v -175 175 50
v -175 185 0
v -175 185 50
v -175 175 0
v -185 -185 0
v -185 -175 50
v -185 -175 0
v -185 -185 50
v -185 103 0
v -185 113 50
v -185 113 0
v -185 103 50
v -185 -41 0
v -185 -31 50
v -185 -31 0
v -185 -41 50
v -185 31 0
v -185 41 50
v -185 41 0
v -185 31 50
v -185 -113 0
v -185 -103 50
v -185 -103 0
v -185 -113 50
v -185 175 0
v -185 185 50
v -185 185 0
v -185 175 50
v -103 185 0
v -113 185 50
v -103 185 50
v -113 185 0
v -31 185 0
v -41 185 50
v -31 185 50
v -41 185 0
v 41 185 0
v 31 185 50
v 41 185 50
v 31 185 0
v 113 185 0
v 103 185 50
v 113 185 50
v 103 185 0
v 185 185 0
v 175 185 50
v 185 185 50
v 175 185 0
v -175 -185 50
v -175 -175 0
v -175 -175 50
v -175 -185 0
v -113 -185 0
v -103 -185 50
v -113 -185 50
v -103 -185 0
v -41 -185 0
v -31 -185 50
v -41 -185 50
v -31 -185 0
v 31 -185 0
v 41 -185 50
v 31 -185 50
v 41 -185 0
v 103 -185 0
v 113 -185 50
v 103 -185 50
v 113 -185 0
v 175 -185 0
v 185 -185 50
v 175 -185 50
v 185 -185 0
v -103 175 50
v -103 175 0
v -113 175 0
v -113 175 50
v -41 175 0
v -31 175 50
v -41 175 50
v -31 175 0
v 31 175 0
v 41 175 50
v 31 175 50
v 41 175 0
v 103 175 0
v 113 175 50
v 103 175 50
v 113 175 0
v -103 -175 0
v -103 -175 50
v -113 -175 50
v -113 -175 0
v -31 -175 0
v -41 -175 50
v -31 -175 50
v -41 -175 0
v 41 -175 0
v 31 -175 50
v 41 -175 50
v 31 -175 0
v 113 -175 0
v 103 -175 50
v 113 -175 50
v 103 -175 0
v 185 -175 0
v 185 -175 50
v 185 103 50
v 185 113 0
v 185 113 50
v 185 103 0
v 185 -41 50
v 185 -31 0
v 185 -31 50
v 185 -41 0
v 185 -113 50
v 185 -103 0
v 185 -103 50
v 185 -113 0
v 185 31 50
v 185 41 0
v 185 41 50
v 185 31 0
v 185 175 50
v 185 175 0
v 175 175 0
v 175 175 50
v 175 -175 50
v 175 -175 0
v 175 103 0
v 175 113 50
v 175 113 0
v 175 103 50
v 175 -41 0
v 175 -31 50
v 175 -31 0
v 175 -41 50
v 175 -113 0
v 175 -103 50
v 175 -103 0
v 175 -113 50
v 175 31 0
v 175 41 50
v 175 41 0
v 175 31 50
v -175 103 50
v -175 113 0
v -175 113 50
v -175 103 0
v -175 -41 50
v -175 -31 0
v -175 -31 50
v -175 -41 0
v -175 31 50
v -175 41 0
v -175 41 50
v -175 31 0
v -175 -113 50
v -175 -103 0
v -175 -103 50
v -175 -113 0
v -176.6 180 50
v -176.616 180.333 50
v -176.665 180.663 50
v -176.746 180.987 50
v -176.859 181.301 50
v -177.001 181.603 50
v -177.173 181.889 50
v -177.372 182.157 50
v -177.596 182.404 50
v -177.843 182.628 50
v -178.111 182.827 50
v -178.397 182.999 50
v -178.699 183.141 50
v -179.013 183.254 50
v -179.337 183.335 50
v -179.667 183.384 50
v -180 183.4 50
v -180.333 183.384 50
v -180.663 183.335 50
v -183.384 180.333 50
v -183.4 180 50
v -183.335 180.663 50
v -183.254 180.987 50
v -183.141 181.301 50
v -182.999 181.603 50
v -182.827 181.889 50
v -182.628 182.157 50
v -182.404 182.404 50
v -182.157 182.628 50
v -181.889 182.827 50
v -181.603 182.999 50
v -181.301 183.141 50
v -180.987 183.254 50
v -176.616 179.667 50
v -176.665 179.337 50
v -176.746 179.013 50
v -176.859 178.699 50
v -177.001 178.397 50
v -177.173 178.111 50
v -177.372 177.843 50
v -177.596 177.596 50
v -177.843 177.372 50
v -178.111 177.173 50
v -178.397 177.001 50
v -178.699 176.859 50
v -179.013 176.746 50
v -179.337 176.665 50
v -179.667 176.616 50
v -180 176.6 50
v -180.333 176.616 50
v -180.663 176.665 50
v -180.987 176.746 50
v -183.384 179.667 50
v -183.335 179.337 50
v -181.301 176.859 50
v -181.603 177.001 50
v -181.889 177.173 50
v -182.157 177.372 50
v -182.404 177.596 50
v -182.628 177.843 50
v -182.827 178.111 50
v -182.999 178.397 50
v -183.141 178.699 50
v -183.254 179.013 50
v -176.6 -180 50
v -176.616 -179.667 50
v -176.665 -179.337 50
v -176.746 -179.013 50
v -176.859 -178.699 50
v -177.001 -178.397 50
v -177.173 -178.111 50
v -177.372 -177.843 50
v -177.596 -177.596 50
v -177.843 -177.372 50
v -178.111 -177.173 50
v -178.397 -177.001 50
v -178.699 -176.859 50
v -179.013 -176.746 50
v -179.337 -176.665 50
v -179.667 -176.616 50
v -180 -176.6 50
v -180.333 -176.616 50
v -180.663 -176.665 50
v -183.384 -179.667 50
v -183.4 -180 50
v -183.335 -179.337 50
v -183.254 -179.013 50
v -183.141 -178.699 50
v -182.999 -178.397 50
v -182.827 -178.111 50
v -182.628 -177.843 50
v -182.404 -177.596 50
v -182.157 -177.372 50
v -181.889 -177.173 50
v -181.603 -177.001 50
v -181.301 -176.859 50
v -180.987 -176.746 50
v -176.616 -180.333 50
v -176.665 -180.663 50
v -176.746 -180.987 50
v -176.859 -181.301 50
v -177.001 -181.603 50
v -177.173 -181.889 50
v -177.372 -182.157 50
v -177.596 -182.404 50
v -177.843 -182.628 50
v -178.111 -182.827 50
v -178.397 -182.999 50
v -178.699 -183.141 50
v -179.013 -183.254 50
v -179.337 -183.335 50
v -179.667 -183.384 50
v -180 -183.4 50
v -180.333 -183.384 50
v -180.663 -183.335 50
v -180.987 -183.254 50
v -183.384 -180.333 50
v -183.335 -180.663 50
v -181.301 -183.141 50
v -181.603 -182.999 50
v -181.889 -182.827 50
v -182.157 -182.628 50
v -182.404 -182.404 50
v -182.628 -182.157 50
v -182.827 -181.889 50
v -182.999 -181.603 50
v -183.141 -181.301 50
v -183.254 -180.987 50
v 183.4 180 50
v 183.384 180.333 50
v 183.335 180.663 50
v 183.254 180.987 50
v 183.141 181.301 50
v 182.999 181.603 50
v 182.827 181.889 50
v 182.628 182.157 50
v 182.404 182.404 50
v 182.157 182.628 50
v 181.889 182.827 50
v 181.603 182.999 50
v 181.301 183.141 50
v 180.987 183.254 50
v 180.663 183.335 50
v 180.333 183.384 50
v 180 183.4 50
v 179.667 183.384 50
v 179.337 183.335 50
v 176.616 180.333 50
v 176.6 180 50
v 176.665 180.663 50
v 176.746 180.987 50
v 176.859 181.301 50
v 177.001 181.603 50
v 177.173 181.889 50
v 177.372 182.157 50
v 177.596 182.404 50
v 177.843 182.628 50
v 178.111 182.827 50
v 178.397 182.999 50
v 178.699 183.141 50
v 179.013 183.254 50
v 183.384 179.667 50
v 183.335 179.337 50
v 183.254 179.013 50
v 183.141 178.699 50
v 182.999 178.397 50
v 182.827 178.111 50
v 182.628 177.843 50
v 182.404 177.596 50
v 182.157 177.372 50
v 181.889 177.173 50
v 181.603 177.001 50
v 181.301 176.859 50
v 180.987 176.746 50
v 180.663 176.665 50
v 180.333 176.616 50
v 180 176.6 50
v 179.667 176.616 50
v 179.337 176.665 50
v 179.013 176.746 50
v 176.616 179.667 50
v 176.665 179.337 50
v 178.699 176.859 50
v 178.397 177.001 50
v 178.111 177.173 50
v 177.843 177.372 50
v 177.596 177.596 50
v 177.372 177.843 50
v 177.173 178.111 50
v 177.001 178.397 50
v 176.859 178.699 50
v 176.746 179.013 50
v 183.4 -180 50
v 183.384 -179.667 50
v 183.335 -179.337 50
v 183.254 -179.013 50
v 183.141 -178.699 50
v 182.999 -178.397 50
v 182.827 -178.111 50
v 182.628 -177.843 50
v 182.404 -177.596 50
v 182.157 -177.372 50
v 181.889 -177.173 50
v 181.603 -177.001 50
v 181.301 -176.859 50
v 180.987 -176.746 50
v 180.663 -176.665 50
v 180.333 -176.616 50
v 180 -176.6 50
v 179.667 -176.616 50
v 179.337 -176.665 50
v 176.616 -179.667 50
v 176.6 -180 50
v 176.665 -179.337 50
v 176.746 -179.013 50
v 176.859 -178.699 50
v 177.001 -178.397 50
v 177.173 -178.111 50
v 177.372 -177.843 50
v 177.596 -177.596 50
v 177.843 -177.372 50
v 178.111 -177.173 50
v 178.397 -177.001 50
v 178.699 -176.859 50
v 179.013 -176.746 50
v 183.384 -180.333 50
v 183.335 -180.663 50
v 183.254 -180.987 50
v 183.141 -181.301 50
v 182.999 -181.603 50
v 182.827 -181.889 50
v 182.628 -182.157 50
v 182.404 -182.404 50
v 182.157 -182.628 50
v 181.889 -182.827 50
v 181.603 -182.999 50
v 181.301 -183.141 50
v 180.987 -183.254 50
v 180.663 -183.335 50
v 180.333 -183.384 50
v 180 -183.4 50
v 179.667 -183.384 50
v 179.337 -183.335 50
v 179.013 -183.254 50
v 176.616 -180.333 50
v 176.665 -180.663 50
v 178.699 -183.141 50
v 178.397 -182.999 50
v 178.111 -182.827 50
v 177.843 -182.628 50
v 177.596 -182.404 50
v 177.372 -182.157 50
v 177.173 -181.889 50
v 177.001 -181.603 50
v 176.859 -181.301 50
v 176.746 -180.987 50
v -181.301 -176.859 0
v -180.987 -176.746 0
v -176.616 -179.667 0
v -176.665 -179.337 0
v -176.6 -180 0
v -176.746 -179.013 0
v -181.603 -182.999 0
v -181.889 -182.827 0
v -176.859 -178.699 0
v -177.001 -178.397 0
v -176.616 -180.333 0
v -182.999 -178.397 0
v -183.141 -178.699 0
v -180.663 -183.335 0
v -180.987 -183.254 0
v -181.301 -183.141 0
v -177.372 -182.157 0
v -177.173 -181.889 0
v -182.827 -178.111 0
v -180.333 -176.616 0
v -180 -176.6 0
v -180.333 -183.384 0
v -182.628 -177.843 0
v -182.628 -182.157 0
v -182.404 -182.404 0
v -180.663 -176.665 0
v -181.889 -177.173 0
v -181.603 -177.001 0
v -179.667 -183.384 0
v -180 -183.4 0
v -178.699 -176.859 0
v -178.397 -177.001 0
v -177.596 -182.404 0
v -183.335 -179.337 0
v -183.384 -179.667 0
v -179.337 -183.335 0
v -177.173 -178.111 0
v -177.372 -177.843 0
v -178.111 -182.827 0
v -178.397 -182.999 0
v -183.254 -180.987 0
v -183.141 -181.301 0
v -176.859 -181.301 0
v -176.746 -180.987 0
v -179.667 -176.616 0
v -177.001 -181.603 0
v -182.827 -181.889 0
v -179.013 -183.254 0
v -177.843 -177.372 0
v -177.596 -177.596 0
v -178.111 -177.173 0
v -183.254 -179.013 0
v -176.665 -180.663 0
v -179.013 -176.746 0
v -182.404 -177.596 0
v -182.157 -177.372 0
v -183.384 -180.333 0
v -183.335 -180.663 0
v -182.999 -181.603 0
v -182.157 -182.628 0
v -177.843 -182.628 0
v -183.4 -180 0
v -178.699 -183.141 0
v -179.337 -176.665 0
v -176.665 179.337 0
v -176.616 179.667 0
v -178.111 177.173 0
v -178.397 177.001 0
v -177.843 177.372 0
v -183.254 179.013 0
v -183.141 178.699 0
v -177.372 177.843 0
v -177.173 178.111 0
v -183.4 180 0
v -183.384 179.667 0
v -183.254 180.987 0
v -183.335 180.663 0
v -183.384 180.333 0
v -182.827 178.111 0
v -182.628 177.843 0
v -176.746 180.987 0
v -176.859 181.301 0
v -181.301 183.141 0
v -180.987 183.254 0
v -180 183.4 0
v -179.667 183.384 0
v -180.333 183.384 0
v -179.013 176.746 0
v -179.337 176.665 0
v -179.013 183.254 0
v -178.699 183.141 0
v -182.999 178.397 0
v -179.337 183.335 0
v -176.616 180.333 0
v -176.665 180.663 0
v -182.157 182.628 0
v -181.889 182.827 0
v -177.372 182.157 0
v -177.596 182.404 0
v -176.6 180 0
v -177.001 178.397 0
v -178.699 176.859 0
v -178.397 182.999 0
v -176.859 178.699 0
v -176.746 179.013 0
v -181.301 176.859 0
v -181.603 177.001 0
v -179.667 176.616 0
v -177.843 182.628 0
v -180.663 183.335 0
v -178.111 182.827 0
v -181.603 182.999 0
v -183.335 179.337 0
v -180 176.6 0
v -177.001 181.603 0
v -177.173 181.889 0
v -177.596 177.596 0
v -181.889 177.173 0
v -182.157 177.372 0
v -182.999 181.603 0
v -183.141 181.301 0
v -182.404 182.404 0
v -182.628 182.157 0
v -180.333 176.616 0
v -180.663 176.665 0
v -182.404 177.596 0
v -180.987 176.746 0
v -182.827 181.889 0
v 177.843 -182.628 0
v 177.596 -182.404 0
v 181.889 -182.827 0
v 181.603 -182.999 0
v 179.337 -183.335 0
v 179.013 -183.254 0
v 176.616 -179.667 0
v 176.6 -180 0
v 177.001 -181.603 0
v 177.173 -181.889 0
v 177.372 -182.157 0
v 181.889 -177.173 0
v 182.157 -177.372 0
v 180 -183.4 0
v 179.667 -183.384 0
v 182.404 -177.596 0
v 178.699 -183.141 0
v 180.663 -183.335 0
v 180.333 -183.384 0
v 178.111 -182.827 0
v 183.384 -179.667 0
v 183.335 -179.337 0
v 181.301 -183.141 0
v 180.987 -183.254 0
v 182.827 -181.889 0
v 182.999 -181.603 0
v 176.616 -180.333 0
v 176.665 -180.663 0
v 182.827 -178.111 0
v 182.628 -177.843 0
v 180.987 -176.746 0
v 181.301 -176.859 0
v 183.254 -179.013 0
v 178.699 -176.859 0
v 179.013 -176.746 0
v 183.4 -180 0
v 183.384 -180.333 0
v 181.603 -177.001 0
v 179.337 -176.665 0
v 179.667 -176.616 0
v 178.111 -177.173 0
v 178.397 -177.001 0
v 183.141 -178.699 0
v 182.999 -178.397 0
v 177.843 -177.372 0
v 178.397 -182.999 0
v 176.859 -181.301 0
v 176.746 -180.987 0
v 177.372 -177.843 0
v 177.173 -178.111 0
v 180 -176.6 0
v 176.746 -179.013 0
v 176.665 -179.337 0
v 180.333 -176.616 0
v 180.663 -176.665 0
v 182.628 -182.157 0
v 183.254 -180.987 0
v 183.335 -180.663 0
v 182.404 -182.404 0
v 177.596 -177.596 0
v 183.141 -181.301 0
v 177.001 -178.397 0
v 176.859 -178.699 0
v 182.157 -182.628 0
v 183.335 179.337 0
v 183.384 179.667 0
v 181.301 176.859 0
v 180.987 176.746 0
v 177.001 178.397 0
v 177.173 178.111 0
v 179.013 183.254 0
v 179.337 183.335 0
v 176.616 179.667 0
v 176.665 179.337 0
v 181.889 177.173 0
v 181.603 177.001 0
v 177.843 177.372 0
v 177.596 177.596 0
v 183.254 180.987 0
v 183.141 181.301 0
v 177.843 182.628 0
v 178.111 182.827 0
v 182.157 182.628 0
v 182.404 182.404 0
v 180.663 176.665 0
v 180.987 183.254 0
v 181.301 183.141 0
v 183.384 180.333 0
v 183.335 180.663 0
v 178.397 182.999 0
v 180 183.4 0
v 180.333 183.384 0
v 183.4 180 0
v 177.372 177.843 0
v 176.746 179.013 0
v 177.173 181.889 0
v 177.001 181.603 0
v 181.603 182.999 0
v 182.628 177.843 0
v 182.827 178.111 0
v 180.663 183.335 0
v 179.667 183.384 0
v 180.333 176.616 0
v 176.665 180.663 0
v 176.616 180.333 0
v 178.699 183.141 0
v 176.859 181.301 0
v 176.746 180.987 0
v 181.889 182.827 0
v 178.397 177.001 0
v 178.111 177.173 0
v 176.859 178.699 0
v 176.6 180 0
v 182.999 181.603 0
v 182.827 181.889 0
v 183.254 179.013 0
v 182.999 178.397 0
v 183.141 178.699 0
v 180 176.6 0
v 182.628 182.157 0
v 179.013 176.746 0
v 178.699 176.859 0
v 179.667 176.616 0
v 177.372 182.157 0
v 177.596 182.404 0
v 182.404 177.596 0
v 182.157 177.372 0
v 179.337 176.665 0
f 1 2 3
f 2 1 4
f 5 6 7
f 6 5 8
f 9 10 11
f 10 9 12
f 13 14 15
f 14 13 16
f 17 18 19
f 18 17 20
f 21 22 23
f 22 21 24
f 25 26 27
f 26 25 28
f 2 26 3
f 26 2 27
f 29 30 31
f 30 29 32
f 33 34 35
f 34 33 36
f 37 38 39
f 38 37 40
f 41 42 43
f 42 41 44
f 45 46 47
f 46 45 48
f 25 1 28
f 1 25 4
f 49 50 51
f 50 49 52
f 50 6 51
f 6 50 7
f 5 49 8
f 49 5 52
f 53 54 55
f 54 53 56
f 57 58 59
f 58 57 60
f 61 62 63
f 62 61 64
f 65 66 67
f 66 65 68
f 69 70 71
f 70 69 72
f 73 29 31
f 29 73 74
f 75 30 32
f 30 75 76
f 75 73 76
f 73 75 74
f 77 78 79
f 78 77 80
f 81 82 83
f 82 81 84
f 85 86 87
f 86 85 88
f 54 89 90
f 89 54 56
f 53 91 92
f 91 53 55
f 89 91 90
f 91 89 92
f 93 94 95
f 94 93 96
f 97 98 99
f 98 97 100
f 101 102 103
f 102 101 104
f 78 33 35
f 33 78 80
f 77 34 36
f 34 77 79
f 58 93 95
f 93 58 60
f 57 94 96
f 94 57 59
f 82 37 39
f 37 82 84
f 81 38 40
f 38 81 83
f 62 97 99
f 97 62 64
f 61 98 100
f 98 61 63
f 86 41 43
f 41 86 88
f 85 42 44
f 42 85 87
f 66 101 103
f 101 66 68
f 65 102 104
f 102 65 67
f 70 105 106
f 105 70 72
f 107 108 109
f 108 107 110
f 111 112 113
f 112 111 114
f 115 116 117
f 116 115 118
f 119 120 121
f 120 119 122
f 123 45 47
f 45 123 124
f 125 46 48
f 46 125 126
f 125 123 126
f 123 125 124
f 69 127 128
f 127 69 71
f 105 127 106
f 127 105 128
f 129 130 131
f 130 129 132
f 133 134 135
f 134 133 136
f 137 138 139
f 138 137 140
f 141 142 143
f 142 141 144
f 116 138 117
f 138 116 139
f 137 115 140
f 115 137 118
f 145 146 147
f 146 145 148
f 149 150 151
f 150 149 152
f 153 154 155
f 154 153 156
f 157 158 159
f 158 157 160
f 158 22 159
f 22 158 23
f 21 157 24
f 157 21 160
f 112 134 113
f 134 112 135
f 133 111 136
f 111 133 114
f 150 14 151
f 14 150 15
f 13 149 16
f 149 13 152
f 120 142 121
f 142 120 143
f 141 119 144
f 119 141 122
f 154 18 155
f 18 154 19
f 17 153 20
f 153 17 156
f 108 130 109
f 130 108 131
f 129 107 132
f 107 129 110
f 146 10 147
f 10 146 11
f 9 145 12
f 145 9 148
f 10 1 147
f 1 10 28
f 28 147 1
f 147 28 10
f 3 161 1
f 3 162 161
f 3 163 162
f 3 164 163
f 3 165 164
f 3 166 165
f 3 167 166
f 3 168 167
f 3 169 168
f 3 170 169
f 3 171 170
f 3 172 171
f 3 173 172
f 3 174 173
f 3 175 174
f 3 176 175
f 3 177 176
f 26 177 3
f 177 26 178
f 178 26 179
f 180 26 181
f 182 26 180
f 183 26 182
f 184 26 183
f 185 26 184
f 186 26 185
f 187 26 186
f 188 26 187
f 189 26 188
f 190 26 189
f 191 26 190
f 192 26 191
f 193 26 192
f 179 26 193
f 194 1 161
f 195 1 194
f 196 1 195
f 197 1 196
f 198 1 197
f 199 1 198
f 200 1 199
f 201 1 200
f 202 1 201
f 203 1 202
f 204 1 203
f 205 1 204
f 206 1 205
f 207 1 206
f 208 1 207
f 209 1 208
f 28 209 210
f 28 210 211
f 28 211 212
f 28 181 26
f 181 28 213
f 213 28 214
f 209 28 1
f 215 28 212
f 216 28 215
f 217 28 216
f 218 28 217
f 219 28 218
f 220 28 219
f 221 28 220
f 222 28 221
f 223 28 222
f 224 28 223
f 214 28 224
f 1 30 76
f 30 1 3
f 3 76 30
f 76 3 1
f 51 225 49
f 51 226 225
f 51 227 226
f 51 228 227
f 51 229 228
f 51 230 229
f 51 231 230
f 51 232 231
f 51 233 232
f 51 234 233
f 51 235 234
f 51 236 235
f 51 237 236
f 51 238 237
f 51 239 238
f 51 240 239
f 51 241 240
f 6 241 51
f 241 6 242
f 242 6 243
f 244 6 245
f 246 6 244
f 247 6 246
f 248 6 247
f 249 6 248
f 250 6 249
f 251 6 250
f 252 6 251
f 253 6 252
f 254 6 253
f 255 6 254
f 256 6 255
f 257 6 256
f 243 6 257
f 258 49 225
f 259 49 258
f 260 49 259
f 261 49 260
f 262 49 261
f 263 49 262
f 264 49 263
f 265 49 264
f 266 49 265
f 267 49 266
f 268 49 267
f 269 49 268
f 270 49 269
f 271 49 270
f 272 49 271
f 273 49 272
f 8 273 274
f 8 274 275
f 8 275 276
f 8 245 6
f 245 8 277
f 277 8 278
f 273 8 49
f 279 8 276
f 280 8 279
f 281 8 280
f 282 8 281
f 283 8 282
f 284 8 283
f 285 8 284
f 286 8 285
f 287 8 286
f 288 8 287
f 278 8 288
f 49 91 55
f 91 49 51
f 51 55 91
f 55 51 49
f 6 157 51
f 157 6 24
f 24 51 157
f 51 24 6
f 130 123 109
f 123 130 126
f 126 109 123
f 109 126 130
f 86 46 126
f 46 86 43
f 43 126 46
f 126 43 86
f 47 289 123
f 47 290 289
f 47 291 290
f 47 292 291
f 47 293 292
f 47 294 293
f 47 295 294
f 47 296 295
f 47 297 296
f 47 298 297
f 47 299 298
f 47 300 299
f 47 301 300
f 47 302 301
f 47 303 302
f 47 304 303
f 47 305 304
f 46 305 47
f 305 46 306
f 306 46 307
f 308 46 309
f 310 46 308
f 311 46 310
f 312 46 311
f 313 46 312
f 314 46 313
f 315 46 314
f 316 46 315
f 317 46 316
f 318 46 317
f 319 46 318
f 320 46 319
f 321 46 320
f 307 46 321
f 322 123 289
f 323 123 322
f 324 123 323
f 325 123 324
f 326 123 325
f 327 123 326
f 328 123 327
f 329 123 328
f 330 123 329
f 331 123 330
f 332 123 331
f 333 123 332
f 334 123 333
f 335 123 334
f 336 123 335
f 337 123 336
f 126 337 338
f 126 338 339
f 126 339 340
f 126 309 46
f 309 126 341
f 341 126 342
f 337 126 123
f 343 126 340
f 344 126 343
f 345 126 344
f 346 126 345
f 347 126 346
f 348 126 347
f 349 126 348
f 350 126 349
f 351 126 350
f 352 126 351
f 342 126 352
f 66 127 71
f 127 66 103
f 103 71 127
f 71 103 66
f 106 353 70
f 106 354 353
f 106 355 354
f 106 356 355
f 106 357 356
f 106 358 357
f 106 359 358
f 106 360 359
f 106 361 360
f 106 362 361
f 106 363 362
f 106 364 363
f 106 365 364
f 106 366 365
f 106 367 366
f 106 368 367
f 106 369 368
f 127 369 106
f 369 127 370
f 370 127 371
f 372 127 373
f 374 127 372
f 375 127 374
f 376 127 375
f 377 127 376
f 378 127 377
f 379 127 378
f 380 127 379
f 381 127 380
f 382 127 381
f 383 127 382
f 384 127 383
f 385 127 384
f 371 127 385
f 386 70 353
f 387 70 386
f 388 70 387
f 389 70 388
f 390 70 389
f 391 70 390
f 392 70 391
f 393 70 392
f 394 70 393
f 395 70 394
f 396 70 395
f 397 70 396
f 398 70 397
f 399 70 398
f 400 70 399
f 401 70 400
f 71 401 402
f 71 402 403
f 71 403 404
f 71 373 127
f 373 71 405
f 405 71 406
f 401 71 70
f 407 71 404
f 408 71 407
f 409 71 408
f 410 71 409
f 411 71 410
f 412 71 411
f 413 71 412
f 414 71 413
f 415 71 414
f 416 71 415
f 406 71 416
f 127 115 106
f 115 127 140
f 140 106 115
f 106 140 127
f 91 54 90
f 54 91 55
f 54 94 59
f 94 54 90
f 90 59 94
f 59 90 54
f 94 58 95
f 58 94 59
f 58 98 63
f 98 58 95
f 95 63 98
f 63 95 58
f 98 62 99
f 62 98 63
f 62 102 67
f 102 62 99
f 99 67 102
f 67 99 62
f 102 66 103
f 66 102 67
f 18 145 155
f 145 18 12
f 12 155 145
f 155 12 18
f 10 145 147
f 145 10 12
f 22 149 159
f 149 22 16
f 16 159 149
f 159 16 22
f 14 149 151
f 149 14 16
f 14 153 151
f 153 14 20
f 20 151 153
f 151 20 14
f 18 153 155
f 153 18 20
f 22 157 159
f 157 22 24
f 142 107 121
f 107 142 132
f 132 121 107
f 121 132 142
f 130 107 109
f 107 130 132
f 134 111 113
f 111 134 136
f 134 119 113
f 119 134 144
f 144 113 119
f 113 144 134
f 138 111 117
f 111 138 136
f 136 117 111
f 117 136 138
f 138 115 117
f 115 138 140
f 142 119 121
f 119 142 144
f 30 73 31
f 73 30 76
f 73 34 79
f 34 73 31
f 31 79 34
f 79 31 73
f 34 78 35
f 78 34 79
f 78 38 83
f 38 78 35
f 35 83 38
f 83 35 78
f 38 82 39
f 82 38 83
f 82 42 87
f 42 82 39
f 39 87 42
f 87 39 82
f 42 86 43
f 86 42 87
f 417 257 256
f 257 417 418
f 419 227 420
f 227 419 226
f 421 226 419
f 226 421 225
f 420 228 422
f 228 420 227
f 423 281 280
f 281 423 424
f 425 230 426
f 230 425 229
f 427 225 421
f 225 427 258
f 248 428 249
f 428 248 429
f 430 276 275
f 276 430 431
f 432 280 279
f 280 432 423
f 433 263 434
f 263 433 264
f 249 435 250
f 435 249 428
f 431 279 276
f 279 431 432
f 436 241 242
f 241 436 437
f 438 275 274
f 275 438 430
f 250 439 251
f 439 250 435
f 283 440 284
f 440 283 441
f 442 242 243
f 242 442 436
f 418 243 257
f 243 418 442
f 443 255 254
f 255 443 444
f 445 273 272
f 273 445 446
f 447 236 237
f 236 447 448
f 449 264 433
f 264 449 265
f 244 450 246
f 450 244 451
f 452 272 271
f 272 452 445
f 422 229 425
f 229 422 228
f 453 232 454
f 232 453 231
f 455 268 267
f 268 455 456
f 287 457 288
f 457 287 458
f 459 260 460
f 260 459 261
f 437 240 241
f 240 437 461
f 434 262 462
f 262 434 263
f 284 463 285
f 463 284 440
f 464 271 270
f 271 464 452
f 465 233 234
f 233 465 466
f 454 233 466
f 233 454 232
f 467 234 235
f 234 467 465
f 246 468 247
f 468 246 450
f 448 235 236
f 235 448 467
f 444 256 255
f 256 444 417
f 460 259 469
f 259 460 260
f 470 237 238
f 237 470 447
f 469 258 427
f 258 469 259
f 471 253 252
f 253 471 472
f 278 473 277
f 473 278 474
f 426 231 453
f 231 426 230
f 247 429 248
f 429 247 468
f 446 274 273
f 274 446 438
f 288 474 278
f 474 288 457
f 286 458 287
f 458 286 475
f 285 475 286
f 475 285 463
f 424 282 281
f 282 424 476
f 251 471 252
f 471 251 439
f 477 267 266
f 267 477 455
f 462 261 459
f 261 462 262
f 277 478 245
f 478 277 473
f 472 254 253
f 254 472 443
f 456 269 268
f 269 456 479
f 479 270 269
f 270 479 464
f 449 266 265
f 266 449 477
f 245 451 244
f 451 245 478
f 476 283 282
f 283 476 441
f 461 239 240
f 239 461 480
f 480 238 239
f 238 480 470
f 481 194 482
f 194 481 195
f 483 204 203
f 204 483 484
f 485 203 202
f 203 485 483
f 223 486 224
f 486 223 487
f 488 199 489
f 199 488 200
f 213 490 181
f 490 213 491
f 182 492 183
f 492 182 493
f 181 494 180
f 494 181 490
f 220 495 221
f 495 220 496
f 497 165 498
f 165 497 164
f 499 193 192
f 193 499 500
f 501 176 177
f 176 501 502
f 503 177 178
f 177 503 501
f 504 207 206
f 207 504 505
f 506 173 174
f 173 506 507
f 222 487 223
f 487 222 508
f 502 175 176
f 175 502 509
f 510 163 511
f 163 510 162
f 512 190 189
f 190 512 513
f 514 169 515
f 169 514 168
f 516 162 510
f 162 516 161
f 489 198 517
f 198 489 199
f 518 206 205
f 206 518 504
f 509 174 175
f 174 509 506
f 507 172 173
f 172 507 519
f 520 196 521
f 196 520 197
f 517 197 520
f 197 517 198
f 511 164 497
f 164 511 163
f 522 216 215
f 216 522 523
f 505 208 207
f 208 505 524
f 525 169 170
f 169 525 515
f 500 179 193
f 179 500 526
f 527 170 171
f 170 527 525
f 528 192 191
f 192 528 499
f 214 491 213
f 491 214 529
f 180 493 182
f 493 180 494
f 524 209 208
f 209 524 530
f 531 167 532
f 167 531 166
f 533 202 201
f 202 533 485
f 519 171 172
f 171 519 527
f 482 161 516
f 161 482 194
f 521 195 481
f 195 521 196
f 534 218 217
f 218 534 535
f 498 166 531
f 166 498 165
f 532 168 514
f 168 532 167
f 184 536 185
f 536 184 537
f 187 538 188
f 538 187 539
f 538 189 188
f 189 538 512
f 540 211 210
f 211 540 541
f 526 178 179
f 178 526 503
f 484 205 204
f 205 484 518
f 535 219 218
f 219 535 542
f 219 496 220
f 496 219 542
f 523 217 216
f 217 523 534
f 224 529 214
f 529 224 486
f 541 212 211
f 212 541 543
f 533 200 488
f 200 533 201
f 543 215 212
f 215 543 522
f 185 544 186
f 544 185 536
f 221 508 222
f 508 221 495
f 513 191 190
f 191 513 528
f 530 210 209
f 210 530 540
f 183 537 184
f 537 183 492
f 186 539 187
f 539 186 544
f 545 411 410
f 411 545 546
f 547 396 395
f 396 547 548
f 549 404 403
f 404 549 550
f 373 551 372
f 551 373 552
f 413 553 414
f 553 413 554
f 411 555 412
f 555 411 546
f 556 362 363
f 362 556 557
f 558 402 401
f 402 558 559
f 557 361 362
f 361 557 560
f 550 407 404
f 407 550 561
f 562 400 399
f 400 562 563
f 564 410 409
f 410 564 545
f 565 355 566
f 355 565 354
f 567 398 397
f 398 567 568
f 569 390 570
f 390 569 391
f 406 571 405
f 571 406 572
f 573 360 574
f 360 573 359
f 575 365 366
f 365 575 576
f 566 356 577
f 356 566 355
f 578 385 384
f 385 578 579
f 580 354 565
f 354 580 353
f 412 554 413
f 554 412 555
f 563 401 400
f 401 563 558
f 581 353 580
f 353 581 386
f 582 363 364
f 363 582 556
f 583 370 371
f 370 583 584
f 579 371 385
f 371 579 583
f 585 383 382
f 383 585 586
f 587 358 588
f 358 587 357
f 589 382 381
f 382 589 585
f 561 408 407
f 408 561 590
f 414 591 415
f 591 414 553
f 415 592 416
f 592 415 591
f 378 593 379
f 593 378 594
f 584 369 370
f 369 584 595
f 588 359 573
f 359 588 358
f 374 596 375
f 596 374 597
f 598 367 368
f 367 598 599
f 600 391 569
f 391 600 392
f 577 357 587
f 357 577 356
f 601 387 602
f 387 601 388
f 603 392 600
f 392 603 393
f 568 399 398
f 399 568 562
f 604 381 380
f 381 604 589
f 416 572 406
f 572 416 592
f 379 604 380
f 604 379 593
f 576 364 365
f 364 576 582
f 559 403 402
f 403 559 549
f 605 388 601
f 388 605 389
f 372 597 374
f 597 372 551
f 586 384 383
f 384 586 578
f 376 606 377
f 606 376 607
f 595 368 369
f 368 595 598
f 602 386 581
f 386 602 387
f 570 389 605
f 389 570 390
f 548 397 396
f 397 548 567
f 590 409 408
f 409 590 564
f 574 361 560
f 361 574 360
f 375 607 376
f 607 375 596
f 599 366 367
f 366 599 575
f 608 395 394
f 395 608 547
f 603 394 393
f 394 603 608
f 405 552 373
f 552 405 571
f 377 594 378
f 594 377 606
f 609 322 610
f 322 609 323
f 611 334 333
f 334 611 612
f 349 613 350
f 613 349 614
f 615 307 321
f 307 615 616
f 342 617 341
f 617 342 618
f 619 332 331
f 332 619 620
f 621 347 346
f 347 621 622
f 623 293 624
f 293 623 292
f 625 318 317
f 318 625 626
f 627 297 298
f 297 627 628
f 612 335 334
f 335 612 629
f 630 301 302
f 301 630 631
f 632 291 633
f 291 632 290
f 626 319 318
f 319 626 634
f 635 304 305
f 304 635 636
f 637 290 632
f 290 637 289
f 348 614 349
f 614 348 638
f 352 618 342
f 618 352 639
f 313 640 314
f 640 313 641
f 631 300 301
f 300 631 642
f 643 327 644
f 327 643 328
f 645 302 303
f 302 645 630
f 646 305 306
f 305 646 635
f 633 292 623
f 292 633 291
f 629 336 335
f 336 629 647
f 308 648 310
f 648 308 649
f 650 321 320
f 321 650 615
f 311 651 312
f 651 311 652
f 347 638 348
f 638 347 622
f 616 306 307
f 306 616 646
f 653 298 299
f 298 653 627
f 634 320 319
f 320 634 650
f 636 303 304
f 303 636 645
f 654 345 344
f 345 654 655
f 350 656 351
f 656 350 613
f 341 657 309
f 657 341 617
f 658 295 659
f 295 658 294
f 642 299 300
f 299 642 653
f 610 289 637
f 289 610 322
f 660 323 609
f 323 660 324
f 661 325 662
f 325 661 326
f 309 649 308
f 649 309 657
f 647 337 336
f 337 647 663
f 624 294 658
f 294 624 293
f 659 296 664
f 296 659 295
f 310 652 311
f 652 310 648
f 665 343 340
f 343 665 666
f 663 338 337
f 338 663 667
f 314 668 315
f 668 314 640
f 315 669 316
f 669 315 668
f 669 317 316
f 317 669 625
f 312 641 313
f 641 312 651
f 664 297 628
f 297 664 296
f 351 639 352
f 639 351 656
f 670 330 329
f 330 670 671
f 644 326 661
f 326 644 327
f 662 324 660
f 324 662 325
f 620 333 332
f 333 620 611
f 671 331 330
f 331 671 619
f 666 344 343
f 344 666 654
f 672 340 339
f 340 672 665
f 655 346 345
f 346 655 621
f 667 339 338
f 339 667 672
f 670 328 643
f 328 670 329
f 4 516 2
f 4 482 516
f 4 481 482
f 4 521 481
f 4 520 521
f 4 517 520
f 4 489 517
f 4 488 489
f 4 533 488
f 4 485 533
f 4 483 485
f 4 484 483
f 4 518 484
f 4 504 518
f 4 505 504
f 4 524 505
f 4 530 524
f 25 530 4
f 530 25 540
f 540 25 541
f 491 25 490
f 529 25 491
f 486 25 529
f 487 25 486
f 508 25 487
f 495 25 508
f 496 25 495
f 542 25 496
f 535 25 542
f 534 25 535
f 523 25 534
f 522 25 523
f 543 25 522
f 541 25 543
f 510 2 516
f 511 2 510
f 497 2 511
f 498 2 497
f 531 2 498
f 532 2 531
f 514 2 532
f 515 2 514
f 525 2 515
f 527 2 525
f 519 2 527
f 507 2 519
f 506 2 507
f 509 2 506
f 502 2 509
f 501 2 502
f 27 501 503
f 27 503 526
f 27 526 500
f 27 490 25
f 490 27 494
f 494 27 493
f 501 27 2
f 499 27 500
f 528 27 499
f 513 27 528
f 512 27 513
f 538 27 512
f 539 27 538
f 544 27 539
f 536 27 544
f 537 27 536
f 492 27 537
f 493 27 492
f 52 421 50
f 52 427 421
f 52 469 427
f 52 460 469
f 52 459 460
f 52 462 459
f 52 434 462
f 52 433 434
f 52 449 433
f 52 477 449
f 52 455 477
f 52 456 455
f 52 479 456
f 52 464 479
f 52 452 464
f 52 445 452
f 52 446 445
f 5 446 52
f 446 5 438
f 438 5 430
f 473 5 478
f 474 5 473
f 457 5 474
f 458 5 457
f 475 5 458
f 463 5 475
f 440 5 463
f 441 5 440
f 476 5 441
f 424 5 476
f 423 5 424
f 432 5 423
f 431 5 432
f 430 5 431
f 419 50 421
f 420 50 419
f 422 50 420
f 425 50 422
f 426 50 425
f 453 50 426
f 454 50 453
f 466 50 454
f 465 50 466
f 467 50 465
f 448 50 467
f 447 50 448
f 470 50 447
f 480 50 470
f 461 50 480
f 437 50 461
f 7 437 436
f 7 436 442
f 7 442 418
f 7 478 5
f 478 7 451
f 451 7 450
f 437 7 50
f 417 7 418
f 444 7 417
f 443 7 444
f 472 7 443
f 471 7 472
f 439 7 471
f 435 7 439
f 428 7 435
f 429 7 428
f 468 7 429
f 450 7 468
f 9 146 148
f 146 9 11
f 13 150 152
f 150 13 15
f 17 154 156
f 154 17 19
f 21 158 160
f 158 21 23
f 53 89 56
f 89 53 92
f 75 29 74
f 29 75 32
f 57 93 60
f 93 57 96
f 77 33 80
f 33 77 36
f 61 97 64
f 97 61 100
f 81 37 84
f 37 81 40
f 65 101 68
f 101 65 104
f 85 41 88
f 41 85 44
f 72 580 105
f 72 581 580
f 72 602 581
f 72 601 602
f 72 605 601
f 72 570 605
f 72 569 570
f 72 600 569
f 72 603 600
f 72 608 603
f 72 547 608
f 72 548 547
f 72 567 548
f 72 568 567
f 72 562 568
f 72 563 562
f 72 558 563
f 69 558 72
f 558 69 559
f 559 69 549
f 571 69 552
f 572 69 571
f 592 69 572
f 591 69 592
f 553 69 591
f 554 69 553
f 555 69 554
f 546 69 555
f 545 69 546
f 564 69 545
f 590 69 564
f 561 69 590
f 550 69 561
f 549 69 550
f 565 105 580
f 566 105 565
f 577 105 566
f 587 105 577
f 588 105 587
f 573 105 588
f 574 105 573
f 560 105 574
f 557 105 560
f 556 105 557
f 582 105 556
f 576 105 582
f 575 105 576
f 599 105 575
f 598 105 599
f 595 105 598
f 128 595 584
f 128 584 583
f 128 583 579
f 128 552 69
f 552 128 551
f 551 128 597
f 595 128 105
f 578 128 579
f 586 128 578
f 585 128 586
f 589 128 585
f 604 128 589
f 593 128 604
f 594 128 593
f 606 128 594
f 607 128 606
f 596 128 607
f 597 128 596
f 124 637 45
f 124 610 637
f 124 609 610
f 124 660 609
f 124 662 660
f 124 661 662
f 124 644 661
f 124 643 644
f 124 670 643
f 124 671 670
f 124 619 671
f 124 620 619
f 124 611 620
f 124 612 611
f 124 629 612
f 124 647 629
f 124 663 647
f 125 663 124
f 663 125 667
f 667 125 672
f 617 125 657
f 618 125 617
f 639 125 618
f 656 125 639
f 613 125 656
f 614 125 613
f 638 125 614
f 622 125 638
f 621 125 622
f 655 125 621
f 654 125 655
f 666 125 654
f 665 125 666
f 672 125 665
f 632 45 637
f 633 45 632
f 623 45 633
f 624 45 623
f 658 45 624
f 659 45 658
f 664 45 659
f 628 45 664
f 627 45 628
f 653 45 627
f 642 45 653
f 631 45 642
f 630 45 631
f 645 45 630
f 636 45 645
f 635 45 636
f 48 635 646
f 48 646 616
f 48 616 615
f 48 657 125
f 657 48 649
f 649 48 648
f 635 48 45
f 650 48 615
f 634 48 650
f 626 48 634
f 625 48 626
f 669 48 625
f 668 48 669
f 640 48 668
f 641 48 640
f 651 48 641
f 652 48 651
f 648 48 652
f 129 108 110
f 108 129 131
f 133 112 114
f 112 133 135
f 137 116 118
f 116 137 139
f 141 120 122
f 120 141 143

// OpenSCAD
// Cage slice part (z0..z1). Units: mm.
// Print orientation: normal

bar=10;
inner=[350,350,700];
gap_xy=62;
gap_z=61;
hole_d=6.8;
$fn=64;

outer=[inner[0]+2*bar, inner[1]+2*bar, inner[2]+2*bar];
half=[outer[0]/2, outer[1]/2, outer[2]/2];

pitch_xy=bar+gap_xy;
pitch_z=bar+gap_z;

centers=[for(i=[0:5]) -(half[0]-bar/2) + i*pitch_xy];
z_levels=[for(i=[0:10]) i*pitch_z];

module vbar(xc,yc){ translate([xc-bar/2,yc-bar/2,0]) cube([bar,bar,outer[2]],center=false); }
module hbar_x(yc,z0){ translate([-half[0],yc-bar/2,z0]) cube([outer[0],bar,bar],center=false); }
module hbar_y(xc,z0){ translate([xc-bar/2,-half[1],z0]) cube([bar,outer[1],bar],center=false); }

module grid(z0){ union(){ for(yc=centers) hbar_x(yc,z0); for(xc=centers) hbar_y(xc,z0); } }

module side_verticals(){
  union(){
    for(xc=centers){ vbar(xc, half[1]-bar/2); vbar(xc,-half[1]+bar/2); }
    for(yc=centers){ vbar( half[0]-bar/2,yc); vbar(-half[0]+bar/2,yc); }
  }
}

module side_rings(){
  union(){
    for(z0=z_levels){
      hbar_x( half[1]-bar/2,z0); hbar_x(-half[1]+bar/2,z0);
      hbar_y( half[0]-bar/2,z0); hbar_y(-half[0]+bar/2,z0);
    }
  }
}

module rod_holes(){
  for(sx=[-1,1],sy=[-1,1]) translate([sx*(half[0]-bar/2), sy*(half[1]-bar/2), -1]) cylinder(d=hole_d,h=outer[2]+2,center=false);
}

module cage(){ difference(){ union(){ side_verticals(); side_rings(); grid(0); grid(outer[2]-bar); } rod_holes(); } }

module cage_slice(zmin,zmax){ intersection(){ cage(); translate([-1000,-1000,zmin]) cube([2000,2000,zmax-zmin],center=false); } }

z0=447; z1=497;
translate([0,0,-z0]) cage_slice(z0,z1);
